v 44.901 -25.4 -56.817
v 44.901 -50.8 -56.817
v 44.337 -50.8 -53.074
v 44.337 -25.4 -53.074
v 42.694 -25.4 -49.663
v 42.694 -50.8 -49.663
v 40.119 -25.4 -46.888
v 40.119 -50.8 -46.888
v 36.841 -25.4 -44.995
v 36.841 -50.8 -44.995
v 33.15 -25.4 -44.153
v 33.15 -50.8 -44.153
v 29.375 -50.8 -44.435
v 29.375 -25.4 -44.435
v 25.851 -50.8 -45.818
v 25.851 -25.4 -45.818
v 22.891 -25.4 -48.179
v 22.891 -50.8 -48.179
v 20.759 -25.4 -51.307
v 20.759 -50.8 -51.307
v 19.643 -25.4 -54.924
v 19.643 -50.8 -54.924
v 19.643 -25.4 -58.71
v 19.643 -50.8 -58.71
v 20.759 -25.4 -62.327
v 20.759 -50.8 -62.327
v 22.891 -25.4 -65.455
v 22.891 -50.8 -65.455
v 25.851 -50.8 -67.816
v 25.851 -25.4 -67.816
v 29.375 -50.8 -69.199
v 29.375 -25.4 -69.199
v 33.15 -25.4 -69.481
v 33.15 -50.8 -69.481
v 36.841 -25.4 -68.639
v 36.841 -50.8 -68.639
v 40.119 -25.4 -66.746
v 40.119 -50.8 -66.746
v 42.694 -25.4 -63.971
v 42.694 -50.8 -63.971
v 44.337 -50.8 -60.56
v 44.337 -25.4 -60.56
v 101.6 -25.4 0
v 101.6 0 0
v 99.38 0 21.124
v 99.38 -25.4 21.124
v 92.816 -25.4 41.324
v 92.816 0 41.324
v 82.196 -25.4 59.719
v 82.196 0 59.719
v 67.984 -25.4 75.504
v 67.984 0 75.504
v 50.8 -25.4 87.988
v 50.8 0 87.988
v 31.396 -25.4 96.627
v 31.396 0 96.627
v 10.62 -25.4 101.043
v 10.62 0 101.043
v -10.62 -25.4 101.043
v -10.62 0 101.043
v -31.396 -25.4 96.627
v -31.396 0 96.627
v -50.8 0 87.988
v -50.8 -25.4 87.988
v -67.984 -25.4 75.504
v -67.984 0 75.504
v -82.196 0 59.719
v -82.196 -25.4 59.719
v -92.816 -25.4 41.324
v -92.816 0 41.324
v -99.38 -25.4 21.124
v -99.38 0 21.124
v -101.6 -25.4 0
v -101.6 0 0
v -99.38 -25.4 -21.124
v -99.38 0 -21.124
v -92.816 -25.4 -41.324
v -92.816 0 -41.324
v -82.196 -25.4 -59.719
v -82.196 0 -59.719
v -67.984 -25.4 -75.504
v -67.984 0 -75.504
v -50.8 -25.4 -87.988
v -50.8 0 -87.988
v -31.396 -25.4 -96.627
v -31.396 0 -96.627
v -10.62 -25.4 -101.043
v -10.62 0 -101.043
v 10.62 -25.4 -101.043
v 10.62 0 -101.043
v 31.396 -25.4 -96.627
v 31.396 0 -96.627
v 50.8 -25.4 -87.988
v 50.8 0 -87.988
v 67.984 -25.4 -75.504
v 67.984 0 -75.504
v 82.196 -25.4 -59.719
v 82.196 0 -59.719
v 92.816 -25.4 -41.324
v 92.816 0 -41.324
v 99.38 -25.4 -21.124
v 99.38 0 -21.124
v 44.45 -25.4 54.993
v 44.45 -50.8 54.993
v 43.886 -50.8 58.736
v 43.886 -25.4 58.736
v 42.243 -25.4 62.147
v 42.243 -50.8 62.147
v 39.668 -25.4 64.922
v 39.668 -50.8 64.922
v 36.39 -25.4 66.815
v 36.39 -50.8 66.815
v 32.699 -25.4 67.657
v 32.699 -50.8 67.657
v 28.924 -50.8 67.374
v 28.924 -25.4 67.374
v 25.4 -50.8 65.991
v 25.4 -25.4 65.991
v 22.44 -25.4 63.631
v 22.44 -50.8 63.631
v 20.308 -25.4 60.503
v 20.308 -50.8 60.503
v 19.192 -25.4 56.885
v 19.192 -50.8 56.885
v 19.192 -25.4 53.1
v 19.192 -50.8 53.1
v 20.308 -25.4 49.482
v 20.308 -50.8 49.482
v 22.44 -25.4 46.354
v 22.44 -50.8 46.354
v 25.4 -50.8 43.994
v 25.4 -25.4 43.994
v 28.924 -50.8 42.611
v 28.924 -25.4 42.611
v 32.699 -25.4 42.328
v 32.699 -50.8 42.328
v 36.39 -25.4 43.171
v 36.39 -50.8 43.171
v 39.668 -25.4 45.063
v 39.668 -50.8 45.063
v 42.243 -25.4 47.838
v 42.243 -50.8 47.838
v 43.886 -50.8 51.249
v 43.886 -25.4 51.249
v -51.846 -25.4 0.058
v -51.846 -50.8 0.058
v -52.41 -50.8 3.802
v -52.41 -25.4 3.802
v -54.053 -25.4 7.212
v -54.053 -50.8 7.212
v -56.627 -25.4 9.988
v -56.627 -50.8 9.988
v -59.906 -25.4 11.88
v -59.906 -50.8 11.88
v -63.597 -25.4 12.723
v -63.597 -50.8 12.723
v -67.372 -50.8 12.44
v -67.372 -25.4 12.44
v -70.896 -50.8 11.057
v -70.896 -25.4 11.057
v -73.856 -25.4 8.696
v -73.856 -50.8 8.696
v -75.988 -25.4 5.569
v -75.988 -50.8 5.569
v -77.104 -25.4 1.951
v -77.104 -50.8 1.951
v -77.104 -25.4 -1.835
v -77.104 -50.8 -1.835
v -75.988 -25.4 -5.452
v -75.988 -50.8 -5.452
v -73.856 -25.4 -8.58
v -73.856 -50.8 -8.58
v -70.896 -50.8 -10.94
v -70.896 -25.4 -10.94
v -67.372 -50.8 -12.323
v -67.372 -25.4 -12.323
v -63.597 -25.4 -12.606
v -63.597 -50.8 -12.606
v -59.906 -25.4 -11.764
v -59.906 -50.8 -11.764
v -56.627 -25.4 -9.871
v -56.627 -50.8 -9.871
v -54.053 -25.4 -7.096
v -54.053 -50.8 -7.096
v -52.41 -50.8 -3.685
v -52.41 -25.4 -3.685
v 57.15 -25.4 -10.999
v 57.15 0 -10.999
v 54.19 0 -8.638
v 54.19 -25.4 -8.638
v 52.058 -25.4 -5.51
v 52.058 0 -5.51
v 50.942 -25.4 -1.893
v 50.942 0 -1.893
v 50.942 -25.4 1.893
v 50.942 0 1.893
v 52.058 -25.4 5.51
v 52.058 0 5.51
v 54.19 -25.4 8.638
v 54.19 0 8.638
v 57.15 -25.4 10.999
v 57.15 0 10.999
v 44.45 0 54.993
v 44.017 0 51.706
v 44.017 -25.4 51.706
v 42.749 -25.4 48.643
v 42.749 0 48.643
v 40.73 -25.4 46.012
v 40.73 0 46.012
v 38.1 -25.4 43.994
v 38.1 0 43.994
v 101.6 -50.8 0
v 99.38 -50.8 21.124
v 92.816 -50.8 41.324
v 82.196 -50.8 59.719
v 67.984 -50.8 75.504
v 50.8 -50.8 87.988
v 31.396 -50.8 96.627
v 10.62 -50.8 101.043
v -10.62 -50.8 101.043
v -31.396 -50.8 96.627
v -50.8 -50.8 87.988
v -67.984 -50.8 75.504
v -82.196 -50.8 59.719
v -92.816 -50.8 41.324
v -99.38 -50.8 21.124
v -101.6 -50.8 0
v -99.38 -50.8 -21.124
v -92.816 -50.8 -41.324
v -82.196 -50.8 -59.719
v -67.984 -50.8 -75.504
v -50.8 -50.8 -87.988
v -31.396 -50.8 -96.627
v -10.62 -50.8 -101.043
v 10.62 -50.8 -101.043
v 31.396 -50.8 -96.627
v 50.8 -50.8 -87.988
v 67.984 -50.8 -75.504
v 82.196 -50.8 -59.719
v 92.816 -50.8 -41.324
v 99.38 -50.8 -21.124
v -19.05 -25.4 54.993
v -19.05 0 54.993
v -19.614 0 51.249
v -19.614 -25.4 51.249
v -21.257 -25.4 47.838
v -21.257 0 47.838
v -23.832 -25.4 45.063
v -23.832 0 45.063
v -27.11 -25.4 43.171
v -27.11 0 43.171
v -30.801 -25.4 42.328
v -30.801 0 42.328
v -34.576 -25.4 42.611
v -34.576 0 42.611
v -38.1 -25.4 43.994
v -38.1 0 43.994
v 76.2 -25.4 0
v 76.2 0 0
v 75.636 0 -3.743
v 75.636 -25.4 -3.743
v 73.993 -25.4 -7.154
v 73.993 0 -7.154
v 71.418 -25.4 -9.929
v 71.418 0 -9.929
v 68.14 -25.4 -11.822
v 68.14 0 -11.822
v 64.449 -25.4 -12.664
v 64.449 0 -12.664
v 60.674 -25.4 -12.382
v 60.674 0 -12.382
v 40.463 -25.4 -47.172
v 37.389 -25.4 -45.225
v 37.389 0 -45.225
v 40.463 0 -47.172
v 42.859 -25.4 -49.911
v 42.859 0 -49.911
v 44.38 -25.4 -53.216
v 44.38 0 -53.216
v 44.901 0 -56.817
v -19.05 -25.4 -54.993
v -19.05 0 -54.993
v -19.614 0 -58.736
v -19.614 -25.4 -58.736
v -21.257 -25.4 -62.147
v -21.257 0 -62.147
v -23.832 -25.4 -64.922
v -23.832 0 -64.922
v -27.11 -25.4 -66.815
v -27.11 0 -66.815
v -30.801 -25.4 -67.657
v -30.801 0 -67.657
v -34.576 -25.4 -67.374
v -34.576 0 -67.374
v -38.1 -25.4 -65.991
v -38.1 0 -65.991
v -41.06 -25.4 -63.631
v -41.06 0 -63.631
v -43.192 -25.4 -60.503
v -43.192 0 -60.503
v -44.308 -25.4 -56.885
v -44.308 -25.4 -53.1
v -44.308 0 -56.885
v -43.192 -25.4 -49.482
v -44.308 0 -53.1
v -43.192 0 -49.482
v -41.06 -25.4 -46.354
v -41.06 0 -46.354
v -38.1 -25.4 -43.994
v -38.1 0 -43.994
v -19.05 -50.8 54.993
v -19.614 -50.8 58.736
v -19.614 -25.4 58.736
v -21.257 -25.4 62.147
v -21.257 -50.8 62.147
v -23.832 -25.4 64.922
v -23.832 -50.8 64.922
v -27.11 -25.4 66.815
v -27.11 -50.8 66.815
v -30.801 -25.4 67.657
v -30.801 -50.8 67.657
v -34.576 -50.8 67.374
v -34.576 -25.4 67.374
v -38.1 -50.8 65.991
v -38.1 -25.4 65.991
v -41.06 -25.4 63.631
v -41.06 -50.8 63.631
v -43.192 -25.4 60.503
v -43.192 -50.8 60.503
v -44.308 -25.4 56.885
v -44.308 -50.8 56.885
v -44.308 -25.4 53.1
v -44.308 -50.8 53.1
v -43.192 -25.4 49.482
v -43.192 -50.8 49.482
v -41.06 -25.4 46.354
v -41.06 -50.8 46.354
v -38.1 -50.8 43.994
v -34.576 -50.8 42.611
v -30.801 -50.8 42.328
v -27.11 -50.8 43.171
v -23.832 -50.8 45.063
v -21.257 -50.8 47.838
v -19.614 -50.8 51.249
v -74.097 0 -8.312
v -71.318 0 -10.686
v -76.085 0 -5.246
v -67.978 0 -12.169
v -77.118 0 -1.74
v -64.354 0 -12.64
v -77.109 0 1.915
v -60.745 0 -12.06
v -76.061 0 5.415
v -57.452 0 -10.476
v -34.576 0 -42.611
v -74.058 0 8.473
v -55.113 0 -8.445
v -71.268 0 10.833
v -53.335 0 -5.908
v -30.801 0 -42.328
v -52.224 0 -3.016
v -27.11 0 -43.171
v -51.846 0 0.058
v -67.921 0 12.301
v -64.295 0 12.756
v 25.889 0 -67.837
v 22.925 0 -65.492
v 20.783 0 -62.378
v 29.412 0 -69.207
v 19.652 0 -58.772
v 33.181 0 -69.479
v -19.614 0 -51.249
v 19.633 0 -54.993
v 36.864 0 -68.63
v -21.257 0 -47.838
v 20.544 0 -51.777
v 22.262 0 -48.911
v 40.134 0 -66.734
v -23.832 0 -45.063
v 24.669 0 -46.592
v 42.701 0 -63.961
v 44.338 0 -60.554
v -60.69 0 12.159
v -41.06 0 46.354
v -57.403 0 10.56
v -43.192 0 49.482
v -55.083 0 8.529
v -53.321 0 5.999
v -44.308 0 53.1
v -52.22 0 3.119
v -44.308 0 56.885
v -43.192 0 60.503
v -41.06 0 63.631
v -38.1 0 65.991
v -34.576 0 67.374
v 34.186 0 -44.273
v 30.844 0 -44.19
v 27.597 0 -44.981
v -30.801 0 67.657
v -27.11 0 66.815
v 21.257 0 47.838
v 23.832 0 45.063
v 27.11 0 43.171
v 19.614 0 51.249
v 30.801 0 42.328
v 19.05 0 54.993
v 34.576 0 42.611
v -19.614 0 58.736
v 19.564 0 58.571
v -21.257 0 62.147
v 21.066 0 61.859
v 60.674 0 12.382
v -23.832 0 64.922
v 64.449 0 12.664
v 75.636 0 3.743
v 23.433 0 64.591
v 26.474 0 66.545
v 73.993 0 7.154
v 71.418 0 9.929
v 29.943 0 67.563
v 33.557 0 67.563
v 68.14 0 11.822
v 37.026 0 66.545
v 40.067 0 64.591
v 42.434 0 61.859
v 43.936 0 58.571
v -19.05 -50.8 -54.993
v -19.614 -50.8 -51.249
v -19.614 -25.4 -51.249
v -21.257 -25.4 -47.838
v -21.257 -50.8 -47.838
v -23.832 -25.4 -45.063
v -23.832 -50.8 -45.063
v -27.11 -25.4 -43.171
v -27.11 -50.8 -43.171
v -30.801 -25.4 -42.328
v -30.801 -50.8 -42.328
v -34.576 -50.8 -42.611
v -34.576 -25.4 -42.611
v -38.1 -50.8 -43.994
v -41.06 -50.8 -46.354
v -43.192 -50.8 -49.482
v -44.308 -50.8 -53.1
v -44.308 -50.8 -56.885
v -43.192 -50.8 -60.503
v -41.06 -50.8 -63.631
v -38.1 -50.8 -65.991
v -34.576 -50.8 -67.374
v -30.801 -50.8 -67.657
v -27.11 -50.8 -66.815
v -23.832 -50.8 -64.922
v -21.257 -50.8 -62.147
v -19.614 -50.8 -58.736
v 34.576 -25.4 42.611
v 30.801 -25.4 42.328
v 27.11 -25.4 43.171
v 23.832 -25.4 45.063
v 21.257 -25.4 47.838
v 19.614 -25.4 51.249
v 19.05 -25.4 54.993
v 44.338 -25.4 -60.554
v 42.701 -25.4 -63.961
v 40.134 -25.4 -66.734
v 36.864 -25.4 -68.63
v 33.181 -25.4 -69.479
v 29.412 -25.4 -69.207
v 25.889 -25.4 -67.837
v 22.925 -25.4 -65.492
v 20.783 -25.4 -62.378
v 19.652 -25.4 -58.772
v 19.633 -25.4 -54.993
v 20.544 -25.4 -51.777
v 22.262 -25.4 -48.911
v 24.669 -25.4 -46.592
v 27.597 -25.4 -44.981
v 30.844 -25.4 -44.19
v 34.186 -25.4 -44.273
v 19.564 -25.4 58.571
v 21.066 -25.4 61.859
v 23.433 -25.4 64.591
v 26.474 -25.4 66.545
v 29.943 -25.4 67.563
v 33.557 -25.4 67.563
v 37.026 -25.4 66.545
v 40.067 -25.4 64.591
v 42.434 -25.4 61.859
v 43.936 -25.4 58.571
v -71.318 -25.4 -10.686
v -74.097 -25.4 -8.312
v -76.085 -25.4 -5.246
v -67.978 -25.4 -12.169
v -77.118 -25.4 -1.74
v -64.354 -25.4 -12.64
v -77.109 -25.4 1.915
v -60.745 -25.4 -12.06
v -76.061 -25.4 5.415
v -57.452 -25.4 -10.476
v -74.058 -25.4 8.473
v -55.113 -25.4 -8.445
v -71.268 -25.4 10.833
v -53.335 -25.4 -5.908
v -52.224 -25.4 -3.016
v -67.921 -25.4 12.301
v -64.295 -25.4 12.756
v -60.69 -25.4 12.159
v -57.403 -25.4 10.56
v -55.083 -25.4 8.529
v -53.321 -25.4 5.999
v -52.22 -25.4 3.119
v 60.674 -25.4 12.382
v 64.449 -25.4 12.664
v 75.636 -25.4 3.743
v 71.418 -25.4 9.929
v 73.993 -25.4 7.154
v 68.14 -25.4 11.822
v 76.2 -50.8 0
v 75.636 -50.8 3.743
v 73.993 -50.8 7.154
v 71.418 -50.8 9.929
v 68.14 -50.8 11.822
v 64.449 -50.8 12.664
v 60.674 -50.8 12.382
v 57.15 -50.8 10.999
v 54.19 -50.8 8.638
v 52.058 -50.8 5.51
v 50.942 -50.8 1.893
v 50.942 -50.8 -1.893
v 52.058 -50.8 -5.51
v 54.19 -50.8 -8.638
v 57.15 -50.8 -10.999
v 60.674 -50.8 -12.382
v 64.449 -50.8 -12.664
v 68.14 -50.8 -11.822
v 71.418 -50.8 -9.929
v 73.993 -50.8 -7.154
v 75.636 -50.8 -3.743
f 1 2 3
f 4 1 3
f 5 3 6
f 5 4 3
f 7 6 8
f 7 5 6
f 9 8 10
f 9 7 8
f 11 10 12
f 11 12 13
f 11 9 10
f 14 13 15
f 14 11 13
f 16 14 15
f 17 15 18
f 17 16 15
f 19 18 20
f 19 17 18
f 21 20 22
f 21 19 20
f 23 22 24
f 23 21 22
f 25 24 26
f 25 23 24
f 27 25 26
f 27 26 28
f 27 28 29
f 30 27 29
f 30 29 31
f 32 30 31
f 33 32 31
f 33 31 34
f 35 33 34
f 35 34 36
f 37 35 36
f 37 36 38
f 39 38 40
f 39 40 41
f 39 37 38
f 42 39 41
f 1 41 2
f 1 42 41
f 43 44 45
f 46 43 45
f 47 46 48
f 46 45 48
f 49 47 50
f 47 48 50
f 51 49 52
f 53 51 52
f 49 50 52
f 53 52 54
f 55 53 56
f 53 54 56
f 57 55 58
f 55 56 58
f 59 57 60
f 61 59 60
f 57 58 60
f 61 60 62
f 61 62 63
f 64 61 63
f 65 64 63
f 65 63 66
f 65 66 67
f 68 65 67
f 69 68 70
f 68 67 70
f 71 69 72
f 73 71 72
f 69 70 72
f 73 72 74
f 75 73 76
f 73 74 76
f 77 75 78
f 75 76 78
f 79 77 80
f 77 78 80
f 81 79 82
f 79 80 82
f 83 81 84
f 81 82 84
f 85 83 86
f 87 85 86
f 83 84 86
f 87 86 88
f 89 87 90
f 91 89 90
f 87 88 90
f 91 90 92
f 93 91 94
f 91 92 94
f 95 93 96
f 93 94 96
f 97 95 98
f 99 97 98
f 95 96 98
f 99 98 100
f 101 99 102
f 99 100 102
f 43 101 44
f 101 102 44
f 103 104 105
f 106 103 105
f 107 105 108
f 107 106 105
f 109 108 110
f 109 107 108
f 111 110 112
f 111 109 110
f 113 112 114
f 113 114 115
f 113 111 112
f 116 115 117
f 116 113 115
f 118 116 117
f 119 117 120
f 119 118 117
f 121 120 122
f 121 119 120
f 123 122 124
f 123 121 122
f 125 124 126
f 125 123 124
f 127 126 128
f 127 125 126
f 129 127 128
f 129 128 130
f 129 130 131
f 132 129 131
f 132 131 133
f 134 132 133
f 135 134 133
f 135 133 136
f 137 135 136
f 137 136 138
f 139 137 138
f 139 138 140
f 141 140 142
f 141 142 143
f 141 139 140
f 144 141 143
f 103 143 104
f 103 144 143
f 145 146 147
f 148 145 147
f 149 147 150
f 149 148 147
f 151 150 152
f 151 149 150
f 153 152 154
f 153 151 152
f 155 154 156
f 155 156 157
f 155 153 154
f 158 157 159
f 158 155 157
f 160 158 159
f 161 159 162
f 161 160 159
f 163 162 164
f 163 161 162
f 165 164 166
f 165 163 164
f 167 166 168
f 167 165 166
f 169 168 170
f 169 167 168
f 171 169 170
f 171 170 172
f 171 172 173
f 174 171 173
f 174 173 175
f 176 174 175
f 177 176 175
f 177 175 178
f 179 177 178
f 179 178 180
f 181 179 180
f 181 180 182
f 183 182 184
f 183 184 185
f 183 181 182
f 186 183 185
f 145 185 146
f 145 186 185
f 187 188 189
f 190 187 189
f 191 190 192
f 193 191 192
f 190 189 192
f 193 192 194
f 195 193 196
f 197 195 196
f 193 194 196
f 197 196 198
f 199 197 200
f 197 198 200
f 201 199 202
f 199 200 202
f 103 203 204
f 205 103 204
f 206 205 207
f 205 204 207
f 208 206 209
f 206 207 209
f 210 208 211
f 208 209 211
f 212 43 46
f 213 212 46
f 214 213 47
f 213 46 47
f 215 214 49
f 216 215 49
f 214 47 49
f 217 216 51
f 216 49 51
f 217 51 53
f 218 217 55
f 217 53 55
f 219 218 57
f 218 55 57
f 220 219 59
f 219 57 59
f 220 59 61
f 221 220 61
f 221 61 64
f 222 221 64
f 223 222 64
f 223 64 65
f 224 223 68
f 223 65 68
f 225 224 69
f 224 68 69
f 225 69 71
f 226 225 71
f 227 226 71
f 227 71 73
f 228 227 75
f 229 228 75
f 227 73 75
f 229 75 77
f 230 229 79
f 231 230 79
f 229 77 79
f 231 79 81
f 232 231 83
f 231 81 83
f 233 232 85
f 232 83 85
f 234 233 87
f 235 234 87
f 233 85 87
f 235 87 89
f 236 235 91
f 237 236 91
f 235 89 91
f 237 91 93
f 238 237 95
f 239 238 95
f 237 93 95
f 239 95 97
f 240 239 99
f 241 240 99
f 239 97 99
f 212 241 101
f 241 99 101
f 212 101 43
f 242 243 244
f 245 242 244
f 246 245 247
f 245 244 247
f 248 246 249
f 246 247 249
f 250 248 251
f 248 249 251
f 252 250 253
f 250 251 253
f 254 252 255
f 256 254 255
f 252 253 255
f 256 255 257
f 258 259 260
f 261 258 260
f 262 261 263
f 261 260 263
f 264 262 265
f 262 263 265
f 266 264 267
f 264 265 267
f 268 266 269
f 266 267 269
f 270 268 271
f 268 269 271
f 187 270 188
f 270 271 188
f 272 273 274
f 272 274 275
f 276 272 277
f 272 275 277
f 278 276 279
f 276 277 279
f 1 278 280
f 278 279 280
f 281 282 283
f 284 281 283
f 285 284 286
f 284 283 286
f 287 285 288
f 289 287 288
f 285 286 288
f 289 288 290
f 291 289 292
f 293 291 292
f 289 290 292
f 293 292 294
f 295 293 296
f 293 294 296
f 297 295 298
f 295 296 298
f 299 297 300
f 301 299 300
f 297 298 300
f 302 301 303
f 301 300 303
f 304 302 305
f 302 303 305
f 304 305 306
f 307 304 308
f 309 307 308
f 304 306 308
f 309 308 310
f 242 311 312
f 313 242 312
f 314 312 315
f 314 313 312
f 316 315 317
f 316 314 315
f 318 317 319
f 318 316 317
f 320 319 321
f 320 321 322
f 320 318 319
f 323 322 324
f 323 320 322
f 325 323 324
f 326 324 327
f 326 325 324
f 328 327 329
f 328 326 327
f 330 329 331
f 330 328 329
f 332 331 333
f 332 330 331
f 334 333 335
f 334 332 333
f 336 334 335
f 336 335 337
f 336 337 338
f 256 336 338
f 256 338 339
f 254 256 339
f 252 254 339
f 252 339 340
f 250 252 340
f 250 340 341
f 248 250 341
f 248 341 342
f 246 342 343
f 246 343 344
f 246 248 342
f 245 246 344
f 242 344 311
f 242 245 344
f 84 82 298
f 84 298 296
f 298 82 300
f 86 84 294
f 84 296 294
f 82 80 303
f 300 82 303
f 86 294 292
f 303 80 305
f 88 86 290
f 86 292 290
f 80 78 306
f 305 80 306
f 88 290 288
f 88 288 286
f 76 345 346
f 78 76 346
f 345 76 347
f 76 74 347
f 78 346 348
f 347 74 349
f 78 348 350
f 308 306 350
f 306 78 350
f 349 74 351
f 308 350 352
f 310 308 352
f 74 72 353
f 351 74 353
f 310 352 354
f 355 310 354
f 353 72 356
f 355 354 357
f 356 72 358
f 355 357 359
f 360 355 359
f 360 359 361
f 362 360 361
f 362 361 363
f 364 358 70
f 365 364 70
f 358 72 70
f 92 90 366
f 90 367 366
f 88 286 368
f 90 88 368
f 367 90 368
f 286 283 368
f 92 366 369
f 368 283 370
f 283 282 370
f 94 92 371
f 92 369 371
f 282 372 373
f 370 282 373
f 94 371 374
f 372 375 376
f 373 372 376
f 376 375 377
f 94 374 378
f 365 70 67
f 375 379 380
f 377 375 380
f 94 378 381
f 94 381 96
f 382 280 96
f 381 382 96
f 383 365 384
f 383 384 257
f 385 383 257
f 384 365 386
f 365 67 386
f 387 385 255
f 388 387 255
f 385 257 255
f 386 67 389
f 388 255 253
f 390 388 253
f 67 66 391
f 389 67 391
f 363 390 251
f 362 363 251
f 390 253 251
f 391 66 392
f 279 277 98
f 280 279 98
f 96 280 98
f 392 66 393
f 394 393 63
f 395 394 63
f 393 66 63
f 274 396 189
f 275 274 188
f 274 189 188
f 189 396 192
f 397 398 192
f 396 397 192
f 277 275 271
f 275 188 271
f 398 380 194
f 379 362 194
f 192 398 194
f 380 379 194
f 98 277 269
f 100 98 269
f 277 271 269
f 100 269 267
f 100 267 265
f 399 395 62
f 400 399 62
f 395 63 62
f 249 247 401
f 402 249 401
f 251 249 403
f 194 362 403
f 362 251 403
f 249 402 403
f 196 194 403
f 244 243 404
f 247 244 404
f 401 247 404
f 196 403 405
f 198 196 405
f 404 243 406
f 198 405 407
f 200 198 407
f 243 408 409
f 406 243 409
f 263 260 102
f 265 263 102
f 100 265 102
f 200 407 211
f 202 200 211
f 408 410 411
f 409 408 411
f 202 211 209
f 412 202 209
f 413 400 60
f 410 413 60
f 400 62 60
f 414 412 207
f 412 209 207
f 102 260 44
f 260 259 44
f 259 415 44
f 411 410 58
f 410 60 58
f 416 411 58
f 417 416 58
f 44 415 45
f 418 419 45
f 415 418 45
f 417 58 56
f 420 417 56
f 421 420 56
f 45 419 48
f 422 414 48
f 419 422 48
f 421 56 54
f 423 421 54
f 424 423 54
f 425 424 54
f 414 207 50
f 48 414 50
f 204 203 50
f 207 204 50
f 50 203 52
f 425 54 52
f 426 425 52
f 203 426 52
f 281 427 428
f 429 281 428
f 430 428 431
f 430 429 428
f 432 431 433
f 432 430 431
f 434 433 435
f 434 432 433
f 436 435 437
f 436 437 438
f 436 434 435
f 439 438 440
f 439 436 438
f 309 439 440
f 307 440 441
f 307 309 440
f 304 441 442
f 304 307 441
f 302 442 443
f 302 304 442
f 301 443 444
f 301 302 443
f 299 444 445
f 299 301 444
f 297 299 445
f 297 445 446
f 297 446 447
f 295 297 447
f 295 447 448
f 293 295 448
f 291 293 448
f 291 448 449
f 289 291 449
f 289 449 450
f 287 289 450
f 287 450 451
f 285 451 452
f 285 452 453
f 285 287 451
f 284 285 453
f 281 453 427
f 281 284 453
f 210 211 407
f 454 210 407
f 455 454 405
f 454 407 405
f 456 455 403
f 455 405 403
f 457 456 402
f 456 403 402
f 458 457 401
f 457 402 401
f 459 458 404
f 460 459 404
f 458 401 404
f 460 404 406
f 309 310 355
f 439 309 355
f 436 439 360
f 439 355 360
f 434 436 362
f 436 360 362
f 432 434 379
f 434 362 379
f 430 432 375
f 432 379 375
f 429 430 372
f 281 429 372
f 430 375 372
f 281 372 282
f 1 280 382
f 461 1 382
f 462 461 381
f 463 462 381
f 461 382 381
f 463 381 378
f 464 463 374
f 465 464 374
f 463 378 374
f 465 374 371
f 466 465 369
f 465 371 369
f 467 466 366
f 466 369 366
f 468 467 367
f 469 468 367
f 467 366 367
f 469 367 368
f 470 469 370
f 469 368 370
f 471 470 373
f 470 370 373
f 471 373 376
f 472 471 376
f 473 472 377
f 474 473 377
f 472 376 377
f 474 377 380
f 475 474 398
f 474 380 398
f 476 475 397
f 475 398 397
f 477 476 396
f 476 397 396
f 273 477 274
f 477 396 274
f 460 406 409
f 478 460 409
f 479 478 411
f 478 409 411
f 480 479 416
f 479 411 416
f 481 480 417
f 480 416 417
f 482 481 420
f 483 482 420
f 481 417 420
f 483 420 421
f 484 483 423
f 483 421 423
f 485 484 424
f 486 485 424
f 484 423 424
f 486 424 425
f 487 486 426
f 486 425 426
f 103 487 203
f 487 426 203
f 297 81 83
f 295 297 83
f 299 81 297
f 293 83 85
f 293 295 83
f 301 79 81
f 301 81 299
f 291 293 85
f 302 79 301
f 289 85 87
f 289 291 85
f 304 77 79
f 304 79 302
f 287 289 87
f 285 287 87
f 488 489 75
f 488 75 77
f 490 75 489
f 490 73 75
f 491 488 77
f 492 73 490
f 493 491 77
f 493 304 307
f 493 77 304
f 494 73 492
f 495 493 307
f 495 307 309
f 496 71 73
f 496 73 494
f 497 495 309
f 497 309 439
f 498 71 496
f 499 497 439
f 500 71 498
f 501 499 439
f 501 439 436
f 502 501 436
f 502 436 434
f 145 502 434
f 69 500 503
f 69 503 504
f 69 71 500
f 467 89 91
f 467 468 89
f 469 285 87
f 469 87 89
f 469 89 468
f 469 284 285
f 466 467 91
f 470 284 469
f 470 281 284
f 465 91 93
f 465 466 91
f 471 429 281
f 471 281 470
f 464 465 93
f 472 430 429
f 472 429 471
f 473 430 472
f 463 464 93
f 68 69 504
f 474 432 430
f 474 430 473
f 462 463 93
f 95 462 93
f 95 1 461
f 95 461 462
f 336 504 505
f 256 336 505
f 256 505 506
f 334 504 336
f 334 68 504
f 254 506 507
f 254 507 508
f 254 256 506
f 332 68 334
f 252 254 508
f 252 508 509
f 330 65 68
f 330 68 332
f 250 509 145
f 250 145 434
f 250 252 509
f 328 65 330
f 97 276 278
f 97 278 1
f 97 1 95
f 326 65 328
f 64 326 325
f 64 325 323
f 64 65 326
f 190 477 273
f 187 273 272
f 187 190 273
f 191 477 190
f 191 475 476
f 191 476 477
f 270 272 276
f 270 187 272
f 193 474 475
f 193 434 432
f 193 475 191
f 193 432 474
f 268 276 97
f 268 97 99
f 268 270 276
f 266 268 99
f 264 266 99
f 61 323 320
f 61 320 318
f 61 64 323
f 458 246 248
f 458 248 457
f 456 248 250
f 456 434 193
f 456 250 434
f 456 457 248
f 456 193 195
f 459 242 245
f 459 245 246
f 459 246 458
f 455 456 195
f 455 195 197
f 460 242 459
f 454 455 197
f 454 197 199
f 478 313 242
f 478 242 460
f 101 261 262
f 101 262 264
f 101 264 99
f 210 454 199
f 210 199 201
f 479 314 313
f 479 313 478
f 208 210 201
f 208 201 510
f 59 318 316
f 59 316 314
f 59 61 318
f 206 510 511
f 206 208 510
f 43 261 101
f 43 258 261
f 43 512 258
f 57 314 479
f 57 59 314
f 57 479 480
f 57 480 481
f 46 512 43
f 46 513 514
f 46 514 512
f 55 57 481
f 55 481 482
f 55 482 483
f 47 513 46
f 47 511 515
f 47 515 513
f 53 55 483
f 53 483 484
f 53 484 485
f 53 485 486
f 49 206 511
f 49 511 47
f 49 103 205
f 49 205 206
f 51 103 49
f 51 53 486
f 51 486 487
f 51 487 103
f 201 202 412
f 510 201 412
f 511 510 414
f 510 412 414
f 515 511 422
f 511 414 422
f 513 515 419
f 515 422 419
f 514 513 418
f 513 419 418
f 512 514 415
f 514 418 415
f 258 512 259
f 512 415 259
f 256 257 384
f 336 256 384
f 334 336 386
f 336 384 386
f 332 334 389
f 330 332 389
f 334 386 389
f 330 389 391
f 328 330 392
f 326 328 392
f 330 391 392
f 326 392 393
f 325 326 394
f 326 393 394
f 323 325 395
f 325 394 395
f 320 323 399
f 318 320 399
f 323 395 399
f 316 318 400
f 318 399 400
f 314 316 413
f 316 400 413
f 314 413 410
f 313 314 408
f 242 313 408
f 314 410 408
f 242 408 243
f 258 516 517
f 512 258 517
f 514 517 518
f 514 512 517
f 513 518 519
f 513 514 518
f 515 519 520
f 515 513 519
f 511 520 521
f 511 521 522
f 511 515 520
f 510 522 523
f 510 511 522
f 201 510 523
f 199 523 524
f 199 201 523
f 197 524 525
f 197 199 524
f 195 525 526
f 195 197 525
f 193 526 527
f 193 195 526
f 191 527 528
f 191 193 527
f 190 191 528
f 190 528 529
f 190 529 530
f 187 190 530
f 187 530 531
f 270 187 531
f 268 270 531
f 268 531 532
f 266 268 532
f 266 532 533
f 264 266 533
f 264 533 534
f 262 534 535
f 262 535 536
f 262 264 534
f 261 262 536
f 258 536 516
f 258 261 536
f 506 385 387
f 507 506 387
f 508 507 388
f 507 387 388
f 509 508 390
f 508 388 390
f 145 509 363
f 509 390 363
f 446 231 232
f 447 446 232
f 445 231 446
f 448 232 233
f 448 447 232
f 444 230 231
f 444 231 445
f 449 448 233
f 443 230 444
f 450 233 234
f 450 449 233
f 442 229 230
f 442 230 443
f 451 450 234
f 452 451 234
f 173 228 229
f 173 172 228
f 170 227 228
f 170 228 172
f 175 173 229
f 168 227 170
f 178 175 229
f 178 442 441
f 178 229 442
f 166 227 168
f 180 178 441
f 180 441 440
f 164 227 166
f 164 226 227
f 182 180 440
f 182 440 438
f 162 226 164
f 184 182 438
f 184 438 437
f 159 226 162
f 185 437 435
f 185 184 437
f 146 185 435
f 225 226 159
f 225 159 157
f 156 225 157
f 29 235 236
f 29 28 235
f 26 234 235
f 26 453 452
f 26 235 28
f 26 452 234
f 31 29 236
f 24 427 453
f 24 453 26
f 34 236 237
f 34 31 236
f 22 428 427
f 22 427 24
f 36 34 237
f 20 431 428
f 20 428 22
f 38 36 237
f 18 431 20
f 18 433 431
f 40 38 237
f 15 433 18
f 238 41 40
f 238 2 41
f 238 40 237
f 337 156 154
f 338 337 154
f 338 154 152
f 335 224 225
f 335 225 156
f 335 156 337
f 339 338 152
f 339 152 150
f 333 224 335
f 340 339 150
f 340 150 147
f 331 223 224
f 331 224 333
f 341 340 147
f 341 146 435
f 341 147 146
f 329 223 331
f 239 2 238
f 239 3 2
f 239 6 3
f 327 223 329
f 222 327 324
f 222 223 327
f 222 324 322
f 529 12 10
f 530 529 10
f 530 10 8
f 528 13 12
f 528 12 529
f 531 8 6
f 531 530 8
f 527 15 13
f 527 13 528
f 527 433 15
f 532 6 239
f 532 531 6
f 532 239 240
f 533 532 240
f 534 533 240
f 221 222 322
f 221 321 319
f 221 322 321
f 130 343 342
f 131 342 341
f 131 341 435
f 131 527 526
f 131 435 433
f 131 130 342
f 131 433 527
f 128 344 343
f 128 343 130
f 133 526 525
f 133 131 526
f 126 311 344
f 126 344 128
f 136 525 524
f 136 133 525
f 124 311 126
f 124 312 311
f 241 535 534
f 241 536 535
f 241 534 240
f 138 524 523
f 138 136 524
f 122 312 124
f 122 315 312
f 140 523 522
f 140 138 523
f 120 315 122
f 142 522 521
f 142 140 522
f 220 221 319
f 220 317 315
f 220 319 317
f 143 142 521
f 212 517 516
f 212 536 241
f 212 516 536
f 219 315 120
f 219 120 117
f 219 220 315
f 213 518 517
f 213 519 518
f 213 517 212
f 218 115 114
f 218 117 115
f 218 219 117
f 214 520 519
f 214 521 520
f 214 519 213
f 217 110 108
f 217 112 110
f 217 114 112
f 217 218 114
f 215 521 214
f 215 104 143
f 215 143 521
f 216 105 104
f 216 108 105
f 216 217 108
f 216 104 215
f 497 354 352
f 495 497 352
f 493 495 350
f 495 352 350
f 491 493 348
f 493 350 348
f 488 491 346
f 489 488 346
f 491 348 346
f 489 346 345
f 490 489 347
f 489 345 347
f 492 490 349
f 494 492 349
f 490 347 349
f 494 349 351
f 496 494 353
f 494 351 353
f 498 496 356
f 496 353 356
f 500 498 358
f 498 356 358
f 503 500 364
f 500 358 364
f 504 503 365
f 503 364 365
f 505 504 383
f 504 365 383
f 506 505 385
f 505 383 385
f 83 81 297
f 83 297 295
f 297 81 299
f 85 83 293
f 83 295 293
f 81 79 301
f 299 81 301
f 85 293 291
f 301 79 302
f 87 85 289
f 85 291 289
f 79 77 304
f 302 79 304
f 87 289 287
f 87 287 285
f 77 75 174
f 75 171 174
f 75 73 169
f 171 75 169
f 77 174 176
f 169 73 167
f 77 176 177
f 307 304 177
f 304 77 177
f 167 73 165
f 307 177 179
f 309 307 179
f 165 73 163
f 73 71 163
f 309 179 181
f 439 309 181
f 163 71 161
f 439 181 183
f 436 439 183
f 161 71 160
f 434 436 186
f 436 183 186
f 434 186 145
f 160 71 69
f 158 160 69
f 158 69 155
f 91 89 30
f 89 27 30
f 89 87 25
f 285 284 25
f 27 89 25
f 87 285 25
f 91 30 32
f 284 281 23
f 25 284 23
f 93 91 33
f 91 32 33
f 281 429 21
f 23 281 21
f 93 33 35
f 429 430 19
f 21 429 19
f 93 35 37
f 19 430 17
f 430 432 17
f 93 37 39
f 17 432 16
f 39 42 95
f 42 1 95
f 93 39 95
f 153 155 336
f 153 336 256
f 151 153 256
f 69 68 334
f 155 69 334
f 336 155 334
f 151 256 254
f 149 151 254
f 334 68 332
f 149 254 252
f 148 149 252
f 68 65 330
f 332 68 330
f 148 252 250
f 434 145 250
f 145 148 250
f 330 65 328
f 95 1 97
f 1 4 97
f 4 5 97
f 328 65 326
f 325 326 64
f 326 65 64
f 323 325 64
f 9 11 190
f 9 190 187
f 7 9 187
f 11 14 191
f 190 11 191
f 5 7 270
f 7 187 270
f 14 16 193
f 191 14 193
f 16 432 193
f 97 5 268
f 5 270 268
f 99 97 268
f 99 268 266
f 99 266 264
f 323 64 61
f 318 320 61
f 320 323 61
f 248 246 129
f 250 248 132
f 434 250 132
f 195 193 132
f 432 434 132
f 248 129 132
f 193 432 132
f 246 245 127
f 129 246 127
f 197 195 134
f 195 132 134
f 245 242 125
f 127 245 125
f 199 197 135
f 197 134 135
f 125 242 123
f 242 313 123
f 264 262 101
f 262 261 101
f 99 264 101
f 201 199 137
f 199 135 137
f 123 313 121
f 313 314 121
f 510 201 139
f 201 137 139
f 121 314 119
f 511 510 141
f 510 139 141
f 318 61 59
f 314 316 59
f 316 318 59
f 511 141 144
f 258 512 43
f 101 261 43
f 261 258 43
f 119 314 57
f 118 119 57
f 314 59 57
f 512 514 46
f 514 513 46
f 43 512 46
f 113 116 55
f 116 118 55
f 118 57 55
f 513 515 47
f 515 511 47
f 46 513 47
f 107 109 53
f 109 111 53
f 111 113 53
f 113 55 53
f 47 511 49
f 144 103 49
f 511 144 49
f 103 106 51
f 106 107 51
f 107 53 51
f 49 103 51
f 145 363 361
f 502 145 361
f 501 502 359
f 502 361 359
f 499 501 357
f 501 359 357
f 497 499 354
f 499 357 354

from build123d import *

# Parameters (mm, degrees)
F0_R     = 101.6
F1_DEPTH = 25.4
F2_R     = 101.6
F2_R_2   = 12.7
F3_DEPTH = 25.4


with BuildPart() as f1:
    # F0 (on Front) → F1 (new body)
    with BuildSketch(Plane.XZ):
        Circle(F0_R)
        with BuildLine():
            Line((19.6325851525, -54.9926131403), (-19.05, -54.9926131403))
            ThreePointArc((-19.05, -54.9926131403), (-38.1, -65.9911357684), (-38.1, -43.9940905122))
            Line((-38.1, -43.9940905122), (-57.4518341607, -10.4757305262))
            ThreePointArc((-57.4518341607, -10.4757305262), (-77.2457617014, 0.0875184165), (-57.4034323023, 10.5595650041))
            Line((-57.4034323023, 10.5595650041), (-38.1, 43.9940905122))
            ThreePointArc((-38.1, 43.9940905122), (-38.1, 65.9911357684), (-19.05, 54.9926131403))
            Line((-19.05, 54.9926131403), (19.05, 54.9926131403))
            ThreePointArc((19.05, 54.9926131403), (31.75, 67.6926131403), (44.45, 54.9926131403))
            ThreePointArc((44.45, 54.9926131403), (42.7485226281, 48.6426131403), (38.1, 43.9940905122))
            Line((38.1, 43.9940905122), (57.15, 10.9985226281))
            ThreePointArc((57.15, 10.9985226281), (69.85, 10.9985226281), (76.2, 0))
            ThreePointArc((76.2, 0), (69.85, -10.9985226281), (57.15, -10.9985226281))
            Line((57.15, -10.9985226281), (37.3892362724, -45.2251694006))
            ThreePointArc((37.3892362724, -45.2251694006), (42.8587779535, -49.9105766959), (44.9008617222, -56.8170100451))
            ThreePointArc((44.9008617222, -56.8170100451), (31.2862887169, -69.4840363819), (19.6325851525, -54.9926131403))
        make_face(mode=Mode.SUBTRACT)
        with BuildLine():
            ThreePointArc((-38.1, -43.9940905122), (-25.4, -43.9940905122), (-19.05, -54.9926131403))
            Line((-19.05, -54.9926131403), (19.6325851525, -54.9926131403))
            ThreePointArc((19.6325851525, -54.9926131403), (26.0798750569, -45.689408226), (37.3892362724, -45.2251694006))
            Line((37.3892362724, -45.2251694006), (57.15, -10.9985226281))
            ThreePointArc((57.15, -10.9985226281), (50.8, 0), (57.15, 10.9985226281))
            Line((57.15, 10.9985226281), (38.1, 43.9940905122))
            ThreePointArc((38.1, 43.9940905122), (25.4, 43.9940905122), (19.05, 54.9926131403))
            Line((19.05, 54.9926131403), (-19.05, 54.9926131403))
            ThreePointArc((-19.05, 54.9926131403), (-25.4, 43.9940905122), (-38.1, 43.9940905122))
            Line((-38.1, 43.9940905122), (-57.4034323023, 10.5595650041))
            ThreePointArc((-57.4034323023, 10.5595650041), (-53.3208674744, 5.9989184369), (-51.8457953215, 0.0582960092))
            ThreePointArc((-51.8457953215, 0.0582960092), (-53.3345664249, -5.9081389925), (-57.4518341607, -10.4757305262))
            Line((-57.4518341607, -10.4757305262), (-38.1, -43.9940905122))
        make_face()
    extrude(amount=F1_DEPTH)


with BuildPart() as f3:
    # F2 (on face) → F3 (new body)
    with BuildSketch(Plane.XZ.offset(25.4)):
        Circle(F2_R)
        with Locations((-31.75, -54.9926131403)):
            Circle(F2_R_2, mode=Mode.SUBTRACT)
        with Locations((32.2008617222, -56.8170100451)):
            Circle(F2_R_2, mode=Mode.SUBTRACT)
        with Locations((63.5, 0)):
            Circle(F2_R_2, mode=Mode.SUBTRACT)
        with Locations((-64.5457953215, 0.0582960092)):
            Circle(F2_R_2, mode=Mode.SUBTRACT)
        with Locations((-31.75, 54.9926131403)):
            Circle(F2_R_2, mode=Mode.SUBTRACT)
        with Locations((31.75, 54.9926131403)):
            Circle(F2_R_2, mode=Mode.SUBTRACT)
    extrude(amount=F3_DEPTH)


solid = Compound([f1.part, f3.part])
